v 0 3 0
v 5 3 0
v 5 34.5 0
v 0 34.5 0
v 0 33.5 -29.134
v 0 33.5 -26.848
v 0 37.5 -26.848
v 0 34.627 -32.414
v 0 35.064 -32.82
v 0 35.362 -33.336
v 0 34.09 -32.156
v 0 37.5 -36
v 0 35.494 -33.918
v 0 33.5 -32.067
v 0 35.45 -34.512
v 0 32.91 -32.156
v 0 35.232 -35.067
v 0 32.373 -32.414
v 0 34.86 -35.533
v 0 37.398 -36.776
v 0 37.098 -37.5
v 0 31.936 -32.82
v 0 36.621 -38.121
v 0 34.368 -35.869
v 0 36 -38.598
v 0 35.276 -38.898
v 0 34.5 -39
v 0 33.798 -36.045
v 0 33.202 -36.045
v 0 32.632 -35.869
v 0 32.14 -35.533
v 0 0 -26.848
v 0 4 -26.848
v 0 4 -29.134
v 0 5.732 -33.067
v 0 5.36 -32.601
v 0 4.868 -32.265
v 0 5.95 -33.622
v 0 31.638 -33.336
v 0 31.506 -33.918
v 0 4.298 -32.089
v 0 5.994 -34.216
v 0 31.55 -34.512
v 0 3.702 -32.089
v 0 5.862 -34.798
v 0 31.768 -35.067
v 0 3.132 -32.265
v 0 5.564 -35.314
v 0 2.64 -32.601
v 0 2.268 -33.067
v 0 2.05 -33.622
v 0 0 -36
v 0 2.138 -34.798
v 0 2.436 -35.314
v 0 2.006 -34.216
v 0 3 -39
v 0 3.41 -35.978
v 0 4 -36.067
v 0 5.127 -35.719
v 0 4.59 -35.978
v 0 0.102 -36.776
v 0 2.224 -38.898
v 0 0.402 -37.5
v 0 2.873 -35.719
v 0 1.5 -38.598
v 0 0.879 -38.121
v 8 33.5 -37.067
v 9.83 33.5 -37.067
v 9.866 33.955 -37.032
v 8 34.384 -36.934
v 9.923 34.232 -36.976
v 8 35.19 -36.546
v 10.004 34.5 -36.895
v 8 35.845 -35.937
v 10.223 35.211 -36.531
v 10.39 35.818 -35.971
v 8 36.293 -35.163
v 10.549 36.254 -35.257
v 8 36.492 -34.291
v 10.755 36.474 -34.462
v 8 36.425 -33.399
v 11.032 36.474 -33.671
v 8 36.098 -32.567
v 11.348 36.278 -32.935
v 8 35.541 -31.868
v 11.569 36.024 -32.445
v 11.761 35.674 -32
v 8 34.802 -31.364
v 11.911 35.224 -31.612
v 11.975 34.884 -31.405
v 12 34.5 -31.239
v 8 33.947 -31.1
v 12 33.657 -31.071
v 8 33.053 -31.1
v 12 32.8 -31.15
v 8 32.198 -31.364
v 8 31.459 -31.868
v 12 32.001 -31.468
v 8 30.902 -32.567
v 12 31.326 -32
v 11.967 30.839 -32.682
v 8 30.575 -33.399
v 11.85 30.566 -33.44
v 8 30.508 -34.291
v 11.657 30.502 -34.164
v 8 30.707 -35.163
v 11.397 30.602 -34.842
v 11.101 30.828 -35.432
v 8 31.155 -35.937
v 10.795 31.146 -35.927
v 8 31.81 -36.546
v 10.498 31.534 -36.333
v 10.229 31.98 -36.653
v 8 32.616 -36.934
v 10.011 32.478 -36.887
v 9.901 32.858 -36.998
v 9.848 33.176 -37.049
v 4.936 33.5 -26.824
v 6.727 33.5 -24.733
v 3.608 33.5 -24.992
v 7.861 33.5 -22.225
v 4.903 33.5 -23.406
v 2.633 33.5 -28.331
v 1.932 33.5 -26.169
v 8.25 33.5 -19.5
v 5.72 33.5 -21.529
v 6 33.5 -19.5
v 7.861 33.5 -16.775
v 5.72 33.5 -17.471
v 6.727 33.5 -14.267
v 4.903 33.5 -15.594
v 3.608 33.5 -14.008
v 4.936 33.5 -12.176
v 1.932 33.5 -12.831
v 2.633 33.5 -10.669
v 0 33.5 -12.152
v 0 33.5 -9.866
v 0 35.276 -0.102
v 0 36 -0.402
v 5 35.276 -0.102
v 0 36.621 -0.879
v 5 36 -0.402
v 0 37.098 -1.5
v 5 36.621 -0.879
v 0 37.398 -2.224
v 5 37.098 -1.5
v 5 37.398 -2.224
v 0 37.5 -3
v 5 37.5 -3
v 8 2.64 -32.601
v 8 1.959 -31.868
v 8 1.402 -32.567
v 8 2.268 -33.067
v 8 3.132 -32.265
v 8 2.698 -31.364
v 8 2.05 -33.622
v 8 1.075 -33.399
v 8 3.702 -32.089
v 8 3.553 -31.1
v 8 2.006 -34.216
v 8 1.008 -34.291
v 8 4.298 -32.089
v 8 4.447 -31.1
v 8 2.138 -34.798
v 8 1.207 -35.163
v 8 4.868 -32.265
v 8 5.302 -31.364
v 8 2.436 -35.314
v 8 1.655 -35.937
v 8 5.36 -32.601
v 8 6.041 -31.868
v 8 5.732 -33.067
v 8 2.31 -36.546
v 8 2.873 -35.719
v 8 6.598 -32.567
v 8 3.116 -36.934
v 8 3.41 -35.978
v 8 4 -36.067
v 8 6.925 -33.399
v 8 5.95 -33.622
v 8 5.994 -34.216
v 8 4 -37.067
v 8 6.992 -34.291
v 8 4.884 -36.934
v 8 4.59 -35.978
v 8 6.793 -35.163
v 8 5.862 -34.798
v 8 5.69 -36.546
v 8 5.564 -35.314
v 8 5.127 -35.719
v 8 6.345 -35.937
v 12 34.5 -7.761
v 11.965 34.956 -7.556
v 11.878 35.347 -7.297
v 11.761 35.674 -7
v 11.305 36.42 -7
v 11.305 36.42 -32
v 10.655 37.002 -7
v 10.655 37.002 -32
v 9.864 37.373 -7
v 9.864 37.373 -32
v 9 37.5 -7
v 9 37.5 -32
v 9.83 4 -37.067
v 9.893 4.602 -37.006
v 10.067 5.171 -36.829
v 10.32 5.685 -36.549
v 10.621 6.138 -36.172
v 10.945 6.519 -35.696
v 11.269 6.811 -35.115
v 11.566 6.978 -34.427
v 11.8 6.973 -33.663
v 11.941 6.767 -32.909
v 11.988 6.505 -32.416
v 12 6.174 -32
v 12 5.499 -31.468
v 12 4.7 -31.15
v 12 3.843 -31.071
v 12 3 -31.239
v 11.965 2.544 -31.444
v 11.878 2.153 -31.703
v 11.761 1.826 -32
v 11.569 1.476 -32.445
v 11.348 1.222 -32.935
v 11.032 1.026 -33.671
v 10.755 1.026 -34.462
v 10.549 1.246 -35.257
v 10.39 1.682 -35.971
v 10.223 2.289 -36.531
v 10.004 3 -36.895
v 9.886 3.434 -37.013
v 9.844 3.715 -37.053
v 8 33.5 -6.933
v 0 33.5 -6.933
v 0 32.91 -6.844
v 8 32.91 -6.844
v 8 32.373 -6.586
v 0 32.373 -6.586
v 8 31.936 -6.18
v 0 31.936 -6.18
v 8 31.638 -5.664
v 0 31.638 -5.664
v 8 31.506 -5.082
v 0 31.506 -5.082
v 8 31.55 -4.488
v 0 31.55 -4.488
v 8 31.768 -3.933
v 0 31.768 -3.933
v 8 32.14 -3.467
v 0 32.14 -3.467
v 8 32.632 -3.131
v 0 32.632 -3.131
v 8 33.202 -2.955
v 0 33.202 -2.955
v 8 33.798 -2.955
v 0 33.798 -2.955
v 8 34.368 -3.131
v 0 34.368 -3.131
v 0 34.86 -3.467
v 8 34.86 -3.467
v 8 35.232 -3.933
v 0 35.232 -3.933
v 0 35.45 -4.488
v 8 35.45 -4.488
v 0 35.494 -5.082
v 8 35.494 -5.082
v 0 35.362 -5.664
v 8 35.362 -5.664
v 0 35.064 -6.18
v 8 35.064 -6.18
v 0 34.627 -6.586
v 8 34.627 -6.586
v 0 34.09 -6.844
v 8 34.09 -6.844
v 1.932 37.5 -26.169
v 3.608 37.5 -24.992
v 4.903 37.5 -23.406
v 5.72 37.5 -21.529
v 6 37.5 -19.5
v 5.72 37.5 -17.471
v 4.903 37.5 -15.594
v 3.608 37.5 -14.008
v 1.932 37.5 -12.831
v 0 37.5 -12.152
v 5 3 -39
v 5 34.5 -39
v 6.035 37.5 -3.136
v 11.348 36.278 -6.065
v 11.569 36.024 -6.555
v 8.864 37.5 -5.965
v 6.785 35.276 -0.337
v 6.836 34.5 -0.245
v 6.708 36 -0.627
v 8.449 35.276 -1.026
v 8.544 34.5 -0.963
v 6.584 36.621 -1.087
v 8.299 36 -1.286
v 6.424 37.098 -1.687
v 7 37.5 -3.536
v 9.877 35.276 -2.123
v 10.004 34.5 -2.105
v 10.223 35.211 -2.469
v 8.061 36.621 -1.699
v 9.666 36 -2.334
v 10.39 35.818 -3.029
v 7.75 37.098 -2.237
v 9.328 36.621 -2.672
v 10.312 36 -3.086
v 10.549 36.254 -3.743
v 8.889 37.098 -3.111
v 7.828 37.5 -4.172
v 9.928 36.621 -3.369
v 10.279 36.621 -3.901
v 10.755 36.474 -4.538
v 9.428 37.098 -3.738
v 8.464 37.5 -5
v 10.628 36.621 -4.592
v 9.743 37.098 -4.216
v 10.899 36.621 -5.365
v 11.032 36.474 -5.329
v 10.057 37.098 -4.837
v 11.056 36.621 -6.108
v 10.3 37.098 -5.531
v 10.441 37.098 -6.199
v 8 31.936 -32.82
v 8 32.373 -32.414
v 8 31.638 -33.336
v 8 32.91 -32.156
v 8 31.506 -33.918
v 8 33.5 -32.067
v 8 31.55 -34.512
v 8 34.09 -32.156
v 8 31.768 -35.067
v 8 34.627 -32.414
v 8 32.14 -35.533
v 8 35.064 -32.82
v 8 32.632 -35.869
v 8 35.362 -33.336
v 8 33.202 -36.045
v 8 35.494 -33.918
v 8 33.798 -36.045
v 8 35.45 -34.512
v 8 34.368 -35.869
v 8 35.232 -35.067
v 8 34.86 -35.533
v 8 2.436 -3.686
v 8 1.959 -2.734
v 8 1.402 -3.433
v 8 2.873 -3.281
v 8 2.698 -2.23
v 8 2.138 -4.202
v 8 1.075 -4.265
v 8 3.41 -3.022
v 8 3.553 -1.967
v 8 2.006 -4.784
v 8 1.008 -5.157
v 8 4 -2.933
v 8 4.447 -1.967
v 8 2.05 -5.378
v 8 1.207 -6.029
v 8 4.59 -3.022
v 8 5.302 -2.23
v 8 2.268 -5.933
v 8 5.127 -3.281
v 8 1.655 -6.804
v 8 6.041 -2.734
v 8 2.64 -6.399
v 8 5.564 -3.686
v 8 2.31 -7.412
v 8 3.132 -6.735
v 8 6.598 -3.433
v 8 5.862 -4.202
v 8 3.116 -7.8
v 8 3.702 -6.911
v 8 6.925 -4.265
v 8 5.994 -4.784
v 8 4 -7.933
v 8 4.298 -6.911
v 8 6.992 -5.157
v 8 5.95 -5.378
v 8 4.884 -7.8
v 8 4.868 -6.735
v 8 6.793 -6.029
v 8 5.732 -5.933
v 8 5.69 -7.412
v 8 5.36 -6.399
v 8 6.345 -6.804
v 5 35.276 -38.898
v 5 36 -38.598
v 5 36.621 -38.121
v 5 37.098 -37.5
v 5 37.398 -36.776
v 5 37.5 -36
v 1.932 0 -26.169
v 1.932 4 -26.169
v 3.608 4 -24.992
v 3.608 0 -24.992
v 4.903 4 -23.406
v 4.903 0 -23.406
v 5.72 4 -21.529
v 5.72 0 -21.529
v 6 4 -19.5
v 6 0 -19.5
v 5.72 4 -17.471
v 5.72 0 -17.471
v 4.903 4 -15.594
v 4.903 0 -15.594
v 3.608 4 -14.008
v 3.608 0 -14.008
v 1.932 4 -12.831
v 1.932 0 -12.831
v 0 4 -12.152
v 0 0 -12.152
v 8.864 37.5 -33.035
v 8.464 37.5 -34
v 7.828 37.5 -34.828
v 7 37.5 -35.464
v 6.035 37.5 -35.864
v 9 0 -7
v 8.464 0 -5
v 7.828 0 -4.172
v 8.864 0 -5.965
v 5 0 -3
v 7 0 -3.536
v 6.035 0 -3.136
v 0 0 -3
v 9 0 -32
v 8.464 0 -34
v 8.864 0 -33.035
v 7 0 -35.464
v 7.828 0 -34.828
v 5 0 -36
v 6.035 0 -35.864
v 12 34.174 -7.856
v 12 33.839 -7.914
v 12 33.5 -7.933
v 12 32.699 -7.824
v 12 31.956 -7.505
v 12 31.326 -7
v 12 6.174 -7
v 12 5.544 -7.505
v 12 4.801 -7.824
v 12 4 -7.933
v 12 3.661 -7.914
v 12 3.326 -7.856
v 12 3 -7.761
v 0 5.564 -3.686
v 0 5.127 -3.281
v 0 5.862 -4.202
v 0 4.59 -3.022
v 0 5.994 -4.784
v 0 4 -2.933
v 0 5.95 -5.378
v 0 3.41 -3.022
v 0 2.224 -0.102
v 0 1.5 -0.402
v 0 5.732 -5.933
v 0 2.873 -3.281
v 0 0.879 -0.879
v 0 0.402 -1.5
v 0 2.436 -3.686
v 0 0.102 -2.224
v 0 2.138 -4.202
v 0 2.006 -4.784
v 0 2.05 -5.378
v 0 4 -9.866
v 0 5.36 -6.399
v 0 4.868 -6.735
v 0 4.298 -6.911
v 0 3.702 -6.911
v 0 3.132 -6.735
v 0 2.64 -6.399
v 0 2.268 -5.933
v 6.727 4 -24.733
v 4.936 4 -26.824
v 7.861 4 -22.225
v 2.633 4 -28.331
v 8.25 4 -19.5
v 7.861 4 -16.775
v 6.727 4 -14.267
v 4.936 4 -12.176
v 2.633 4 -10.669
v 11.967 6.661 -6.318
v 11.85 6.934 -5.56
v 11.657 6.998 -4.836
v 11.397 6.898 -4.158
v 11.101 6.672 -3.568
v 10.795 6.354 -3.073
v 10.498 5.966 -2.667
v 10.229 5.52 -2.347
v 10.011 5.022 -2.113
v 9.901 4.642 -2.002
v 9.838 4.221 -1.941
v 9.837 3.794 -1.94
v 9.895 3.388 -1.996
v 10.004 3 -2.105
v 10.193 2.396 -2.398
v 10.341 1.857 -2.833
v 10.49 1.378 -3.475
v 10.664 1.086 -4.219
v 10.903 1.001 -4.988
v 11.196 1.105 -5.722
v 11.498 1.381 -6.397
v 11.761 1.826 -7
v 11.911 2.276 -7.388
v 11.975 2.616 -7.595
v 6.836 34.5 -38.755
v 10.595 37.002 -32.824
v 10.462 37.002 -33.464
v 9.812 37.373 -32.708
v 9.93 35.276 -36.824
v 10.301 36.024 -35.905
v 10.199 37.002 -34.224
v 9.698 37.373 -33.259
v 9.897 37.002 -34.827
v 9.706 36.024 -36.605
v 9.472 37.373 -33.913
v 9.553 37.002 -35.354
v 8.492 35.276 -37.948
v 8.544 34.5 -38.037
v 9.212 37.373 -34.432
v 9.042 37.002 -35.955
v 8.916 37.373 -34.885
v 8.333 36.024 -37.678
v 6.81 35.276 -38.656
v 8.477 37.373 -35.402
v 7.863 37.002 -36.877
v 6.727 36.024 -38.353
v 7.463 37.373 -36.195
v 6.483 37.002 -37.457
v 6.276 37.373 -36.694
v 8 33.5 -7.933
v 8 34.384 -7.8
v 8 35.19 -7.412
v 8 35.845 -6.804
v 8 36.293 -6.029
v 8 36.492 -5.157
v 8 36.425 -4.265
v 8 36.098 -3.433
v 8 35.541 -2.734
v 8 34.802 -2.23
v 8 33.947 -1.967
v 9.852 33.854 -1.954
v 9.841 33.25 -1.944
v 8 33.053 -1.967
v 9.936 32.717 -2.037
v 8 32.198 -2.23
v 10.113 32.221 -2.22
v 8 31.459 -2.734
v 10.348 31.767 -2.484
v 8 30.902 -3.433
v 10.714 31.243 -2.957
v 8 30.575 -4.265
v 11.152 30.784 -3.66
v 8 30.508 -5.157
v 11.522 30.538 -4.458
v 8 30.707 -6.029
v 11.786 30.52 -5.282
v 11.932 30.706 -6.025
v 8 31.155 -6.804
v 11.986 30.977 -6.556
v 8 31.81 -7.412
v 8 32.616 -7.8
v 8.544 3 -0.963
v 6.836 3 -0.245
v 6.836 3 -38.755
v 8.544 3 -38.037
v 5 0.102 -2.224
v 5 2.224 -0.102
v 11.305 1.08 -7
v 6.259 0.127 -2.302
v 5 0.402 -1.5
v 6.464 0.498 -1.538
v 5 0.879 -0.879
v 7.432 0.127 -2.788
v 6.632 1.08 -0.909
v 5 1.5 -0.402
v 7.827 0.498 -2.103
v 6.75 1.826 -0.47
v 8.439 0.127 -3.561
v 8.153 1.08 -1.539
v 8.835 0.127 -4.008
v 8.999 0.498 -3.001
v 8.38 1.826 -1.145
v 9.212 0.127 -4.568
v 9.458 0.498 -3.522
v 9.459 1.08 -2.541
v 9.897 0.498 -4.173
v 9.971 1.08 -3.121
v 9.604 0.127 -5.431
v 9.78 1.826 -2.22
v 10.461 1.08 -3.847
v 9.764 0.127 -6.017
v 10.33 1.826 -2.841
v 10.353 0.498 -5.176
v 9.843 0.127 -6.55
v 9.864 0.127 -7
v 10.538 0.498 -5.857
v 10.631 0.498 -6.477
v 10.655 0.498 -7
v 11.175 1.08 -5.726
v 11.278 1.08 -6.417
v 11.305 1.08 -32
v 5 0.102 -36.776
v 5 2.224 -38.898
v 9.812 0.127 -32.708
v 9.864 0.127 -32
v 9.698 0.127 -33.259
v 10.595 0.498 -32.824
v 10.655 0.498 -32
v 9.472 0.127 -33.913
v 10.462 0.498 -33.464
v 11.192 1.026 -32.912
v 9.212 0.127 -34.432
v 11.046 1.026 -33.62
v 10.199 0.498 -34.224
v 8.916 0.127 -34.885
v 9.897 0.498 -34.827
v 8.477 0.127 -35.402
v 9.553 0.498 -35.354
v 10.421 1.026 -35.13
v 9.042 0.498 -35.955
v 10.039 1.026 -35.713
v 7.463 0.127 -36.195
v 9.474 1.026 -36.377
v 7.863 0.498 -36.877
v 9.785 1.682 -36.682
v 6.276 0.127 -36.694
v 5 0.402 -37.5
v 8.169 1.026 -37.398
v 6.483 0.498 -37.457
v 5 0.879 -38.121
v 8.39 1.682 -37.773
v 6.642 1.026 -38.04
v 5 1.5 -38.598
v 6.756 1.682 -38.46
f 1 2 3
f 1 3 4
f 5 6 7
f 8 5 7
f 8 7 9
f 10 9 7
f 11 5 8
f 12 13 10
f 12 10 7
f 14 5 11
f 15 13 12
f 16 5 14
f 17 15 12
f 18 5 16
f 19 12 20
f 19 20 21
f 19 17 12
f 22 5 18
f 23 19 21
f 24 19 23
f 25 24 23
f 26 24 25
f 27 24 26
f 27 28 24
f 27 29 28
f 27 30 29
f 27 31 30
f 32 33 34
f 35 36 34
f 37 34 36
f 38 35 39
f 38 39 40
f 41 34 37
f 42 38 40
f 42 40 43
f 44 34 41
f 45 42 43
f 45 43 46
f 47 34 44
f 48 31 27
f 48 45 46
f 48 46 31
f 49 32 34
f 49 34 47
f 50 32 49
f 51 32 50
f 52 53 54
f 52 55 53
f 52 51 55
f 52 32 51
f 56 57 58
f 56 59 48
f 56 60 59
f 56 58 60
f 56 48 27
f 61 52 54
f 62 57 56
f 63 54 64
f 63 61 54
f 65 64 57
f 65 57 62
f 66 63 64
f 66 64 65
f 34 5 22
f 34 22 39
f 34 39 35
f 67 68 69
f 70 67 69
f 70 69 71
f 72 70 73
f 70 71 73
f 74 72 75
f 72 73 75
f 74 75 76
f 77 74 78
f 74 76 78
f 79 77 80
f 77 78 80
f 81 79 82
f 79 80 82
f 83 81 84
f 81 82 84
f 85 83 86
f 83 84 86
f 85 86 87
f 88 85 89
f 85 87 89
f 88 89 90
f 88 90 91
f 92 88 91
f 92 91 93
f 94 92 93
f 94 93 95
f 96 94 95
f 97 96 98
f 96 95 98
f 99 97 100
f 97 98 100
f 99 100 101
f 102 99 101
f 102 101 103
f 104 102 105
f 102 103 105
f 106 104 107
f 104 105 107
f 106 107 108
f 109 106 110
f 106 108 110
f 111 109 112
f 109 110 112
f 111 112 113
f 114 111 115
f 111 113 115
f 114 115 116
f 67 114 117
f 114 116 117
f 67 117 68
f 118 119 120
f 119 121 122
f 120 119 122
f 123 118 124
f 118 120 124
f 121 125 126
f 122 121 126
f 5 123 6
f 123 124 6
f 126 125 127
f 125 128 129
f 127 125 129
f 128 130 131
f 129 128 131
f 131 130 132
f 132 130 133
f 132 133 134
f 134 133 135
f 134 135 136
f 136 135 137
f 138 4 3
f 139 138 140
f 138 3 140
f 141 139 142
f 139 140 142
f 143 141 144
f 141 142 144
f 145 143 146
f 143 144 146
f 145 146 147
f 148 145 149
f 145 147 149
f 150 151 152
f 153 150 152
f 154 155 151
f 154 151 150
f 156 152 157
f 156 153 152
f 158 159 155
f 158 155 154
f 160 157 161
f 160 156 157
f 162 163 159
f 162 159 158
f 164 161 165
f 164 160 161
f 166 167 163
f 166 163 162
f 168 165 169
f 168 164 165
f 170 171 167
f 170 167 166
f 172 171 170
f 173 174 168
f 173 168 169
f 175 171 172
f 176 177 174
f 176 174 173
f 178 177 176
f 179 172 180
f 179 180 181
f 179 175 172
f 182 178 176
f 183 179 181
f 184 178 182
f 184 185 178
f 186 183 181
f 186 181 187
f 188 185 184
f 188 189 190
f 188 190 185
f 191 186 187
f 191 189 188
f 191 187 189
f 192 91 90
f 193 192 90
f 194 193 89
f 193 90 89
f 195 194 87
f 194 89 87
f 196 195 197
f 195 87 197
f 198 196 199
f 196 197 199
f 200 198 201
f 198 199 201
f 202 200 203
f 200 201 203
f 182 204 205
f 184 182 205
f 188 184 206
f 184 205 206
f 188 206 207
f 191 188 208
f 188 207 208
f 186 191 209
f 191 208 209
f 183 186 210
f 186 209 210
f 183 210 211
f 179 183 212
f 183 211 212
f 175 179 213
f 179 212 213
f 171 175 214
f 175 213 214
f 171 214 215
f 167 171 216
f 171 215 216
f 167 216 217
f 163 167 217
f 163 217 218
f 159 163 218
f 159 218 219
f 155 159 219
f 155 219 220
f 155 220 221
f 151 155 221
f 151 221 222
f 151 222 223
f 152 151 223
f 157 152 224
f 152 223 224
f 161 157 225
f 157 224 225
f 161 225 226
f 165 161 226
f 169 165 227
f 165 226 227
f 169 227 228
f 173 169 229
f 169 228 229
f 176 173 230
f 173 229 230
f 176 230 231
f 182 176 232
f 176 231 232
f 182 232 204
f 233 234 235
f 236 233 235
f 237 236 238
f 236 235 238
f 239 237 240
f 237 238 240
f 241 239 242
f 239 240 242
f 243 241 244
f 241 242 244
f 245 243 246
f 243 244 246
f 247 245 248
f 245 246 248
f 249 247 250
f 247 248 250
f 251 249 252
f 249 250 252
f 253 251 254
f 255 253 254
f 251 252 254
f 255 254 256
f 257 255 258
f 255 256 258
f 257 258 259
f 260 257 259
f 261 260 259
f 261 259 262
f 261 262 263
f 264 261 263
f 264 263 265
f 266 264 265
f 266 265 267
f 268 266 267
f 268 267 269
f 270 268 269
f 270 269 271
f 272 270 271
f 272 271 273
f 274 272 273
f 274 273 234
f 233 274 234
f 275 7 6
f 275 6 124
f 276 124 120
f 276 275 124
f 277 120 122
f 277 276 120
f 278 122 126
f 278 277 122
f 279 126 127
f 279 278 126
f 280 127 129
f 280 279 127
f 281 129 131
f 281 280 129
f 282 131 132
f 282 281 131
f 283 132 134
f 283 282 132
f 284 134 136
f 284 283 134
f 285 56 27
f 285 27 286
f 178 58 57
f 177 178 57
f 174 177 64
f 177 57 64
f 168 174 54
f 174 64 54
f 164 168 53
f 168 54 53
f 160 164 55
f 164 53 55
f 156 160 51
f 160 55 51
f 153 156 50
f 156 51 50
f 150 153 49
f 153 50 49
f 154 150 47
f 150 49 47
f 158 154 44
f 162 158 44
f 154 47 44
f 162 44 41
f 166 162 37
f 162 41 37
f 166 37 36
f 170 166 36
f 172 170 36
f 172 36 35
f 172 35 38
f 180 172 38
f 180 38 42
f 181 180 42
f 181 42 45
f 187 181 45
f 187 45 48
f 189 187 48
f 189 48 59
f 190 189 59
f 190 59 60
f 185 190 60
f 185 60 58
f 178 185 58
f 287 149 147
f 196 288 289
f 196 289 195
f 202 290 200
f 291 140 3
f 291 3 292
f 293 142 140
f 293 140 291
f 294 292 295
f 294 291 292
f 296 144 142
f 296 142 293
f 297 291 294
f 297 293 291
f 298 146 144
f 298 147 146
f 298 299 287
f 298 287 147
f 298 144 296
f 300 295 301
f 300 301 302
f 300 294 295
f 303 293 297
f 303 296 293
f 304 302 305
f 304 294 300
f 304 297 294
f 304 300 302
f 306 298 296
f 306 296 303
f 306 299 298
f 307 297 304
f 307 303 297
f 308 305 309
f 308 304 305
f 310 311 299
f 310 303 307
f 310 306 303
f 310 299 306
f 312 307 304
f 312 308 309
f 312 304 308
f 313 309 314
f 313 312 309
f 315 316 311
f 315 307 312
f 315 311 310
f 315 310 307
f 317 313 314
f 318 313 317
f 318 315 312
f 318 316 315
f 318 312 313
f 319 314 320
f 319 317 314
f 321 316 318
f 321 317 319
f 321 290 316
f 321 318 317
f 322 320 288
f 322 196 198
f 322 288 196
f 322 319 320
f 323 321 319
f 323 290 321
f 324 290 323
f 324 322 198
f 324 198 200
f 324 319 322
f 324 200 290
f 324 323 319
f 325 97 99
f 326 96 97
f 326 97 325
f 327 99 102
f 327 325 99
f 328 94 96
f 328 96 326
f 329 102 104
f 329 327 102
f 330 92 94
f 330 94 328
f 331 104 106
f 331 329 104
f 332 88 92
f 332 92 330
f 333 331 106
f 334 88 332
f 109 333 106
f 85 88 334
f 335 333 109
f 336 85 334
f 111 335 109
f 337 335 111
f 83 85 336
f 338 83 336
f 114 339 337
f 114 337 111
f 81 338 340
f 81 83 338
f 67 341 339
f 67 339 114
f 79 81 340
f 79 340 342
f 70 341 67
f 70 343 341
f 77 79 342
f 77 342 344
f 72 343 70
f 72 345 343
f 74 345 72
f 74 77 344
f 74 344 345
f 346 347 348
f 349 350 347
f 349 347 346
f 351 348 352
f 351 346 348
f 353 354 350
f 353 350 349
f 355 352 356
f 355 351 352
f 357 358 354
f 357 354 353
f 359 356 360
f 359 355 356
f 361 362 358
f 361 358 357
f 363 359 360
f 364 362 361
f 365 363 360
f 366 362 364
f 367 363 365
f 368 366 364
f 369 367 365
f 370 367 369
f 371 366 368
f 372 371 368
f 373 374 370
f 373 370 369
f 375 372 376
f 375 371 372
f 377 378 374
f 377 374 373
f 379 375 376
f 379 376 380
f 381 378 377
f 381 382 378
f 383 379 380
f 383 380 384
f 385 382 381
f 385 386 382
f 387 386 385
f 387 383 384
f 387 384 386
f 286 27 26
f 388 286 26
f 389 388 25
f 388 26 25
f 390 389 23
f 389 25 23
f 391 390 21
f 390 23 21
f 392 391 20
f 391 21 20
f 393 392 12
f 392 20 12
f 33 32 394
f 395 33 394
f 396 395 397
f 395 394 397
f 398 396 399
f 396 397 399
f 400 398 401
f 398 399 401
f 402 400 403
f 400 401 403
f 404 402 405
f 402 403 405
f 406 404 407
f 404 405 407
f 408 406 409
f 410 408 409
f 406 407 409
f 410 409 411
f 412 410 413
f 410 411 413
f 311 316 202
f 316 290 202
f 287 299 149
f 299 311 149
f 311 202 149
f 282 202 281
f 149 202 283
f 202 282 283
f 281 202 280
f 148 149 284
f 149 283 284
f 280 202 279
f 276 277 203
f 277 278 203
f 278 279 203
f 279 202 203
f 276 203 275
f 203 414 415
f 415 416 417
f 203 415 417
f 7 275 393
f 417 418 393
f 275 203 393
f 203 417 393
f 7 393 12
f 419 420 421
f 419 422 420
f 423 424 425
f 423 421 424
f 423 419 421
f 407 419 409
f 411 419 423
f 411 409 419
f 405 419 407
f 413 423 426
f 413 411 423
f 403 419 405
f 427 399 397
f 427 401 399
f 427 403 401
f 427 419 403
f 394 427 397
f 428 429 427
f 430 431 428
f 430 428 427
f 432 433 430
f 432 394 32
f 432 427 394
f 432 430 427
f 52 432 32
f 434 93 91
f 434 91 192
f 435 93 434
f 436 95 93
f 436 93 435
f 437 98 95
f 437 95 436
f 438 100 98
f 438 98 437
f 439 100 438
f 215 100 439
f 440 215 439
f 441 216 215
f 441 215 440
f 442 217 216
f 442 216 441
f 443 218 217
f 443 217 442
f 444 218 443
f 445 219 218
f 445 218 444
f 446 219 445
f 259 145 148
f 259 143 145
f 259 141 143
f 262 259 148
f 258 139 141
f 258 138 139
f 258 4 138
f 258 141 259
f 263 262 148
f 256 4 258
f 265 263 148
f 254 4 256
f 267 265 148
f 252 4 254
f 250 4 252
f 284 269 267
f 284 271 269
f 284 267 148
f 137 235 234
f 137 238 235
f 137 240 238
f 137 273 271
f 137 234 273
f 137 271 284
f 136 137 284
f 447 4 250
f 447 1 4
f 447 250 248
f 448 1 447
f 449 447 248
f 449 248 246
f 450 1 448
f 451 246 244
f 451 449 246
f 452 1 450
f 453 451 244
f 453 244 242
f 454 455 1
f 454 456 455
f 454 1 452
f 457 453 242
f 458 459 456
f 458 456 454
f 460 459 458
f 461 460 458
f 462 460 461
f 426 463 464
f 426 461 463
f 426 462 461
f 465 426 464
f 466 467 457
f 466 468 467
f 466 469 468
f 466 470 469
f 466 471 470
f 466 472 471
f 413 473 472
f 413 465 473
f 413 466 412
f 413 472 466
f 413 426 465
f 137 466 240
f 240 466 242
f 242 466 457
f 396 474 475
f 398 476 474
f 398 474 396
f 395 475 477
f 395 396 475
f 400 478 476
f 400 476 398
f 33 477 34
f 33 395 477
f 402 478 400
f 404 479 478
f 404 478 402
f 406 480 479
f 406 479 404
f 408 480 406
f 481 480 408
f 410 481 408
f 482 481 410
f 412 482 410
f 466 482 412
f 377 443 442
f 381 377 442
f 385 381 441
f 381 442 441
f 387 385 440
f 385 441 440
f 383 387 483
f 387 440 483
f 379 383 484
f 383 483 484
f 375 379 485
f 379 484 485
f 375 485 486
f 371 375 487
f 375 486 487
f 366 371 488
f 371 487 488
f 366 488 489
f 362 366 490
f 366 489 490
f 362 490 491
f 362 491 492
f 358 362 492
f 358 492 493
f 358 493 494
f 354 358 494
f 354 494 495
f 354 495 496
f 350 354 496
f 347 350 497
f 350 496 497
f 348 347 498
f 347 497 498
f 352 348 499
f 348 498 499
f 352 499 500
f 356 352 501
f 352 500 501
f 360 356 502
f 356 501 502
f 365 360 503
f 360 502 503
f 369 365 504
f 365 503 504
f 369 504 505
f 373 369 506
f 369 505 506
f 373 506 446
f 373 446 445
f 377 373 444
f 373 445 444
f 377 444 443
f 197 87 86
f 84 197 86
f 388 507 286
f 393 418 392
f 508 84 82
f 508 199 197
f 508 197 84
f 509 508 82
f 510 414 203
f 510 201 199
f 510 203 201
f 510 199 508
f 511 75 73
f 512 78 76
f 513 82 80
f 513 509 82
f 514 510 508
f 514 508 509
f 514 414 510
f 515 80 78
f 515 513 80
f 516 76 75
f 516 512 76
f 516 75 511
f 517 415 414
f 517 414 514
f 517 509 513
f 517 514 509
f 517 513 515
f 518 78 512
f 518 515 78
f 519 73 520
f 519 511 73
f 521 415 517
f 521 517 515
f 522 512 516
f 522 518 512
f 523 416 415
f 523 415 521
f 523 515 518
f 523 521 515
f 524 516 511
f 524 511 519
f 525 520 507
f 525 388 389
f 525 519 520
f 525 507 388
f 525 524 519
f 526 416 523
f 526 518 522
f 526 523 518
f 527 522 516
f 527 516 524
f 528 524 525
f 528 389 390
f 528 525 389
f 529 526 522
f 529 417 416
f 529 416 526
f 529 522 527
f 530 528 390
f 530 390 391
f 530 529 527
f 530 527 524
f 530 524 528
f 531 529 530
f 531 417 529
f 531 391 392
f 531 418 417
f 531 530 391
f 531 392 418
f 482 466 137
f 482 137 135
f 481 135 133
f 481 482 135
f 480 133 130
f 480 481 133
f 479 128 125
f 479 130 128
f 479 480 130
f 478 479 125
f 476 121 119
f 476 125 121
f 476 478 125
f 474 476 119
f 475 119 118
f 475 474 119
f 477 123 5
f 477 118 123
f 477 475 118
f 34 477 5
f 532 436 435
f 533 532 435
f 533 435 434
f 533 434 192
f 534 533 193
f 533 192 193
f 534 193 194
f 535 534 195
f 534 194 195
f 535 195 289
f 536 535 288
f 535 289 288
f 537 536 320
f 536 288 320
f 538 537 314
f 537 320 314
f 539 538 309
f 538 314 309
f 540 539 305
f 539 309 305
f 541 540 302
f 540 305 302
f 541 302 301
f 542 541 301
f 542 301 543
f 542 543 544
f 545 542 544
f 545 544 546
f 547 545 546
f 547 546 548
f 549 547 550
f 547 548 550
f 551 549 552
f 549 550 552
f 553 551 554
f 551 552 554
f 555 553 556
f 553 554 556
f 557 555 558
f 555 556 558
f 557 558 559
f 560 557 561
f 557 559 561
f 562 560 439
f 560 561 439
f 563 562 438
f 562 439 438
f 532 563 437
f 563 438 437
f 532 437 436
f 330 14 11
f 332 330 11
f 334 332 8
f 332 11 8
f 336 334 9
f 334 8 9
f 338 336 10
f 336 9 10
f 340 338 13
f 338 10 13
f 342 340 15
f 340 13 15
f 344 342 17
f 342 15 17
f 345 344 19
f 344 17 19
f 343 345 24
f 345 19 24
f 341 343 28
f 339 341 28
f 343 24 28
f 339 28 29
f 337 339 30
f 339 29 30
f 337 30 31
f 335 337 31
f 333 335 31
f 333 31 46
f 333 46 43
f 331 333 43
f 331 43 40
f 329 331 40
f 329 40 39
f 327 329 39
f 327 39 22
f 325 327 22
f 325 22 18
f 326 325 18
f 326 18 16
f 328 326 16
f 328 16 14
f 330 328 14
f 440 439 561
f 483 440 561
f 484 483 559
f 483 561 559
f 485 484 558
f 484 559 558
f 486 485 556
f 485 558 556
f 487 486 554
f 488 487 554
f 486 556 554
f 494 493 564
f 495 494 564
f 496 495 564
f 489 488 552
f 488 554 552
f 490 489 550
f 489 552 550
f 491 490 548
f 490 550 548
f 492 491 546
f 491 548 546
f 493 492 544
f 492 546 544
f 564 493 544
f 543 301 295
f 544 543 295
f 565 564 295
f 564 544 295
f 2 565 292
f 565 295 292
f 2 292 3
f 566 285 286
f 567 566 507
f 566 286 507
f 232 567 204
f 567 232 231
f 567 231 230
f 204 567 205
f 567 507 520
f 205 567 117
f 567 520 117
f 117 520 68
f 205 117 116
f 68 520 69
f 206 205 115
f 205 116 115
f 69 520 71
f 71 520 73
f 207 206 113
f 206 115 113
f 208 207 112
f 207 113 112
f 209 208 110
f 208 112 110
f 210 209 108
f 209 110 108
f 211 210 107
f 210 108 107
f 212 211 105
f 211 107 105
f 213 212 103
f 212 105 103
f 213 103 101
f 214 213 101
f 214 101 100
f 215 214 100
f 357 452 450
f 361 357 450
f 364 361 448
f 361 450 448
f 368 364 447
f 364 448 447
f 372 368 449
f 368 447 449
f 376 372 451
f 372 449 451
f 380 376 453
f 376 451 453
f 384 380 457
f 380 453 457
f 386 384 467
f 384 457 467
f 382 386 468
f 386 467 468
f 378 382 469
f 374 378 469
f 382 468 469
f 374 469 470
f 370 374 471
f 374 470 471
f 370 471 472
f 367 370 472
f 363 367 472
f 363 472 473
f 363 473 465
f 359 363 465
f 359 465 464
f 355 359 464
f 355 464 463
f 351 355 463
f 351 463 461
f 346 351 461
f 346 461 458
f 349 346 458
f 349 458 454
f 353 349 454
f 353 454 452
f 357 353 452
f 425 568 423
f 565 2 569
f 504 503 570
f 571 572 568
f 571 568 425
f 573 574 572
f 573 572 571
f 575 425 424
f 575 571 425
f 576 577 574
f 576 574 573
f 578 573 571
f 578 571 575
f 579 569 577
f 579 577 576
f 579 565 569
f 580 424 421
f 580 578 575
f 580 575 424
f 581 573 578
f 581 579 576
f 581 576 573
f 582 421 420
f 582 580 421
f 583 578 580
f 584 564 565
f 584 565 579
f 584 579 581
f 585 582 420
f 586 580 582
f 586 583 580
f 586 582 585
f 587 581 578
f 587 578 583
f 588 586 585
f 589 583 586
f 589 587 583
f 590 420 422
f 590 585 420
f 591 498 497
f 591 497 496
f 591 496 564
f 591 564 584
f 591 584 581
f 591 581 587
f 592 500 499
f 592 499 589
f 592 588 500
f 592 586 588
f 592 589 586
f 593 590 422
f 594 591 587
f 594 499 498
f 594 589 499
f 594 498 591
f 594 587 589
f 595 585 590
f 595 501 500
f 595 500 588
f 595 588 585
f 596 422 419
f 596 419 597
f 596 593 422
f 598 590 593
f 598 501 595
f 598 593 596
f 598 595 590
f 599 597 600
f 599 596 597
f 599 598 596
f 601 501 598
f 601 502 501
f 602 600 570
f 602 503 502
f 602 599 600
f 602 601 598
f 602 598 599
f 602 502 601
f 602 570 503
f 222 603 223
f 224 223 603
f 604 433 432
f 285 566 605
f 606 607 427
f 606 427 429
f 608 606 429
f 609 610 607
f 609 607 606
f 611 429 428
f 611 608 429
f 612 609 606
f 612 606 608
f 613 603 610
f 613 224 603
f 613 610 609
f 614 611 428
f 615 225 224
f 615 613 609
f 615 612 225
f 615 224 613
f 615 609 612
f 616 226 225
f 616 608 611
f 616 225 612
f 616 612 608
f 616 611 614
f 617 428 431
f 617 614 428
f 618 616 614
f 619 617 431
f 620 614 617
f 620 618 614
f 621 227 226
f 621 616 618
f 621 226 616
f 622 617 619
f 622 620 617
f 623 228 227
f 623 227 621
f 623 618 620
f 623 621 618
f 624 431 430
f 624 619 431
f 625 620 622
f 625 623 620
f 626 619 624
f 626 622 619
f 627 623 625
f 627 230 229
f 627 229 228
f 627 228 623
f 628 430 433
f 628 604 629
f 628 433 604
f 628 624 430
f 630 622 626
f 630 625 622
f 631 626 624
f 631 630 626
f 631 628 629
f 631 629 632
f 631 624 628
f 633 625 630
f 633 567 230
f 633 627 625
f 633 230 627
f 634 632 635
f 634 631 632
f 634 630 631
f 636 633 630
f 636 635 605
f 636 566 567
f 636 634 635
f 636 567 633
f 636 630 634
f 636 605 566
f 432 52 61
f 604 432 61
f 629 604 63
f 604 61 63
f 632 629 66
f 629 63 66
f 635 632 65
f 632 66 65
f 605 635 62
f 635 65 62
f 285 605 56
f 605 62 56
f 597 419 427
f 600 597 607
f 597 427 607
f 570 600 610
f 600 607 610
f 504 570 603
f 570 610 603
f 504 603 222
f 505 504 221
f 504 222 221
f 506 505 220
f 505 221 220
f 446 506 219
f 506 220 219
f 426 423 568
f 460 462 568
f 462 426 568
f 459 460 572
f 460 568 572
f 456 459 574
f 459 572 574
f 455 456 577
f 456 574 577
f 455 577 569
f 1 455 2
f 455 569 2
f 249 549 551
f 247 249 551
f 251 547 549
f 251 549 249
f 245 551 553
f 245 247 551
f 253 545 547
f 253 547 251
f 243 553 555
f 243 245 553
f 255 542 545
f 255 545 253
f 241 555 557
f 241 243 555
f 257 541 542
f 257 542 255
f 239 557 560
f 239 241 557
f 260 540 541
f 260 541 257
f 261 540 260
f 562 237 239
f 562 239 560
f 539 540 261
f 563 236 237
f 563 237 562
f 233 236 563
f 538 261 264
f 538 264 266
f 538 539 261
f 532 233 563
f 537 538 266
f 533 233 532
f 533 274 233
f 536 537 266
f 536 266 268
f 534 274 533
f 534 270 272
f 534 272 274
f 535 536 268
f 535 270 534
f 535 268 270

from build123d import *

# Parameters (mm, degrees)
BOSS_EXTRU_1_DEPTH      = 37.5
BOSS_EXTRU_2_DEPTH      = 4
ESQUISSE3_R             = 2
ENL_V_MAT_EXTRU_1_DEPTH = 56.418859606
ESQUISSE5_R             = 3
ENL_V_MAT_EXTRU_2_DEPTH = 4
CONG_1_R                = 7
CONG_2_R                = 3


with BuildPart() as part:
    # Esquisse1 → Boss.-Extru.1 (new body)
    with BuildSketch(Plane(origin=(0, 0, 0), x_dir=(1, 0, 0), z_dir=(0, 1, 0))):
        with BuildLine():
            Line((0, 29.133924434), (0, 39))
            Line((0, 39), (12, 39))
            Line((12, 39), (12, 0))
            Line((12, 0), (0, 0))
            Line((0, 0), (0, 9.866075566))
            ThreePointArc((0, 9.866075566), (8.25, 19.5), (0, 29.133924434))
        make_face()
    extrude(amount=BOSS_EXTRU_1_DEPTH)

    # Esquisse2 → Boss.-Extru.2 (add)
    with BuildSketch(Plane.XZ):
        with BuildLine():
            Line((0, 0), (12, 0))
            Line((12, 0), (12, -39))
            Line((12, -39), (0, -39))
            Line((0, -39), (0, -26.848469228))
            ThreePointArc((0, -26.848469228), (6, -19.5), (0, -12.151530772))
            Line((0, -12.151530772), (0, 0))
        make_face()
    boss_extru_2 = extrude(amount=-BOSS_EXTRU_2_DEPTH)

    # Symétrie1: Boss.-Extru.2 across plane
    add(boss_extru_2.mirror(Plane.ZX.offset(18.75)))

    # Esquisse3 → Enlèv. mat.-Extru.1 (cut, through all)
    with BuildSketch(Plane.ZY):
        with Locations((-34.066962217, 33.5)):
            Circle(ESQUISSE3_R)
        with Locations(Location((-34.066962217, 4, 0), (0, 0, 180))):
            Circle(ESQUISSE3_R)
        with Locations((-4.933037783, 4)):
            Circle(ESQUISSE3_R)
        with Locations(Location((-4.933037783, 33.5, 0), (0, 0, 180))):
            Circle(ESQUISSE3_R)
    extrude(amount=-ENL_V_MAT_EXTRU_1_DEPTH, mode=Mode.SUBTRACT)

    # Esquisse5 → Enlèv. mat.-Extru.2 (cut)
    with BuildSketch(Plane(origin=(12, 0, 0), x_dir=(0, 0, -1), z_dir=(1, 0, 0))):
        with Locations((4.933037783, 33.5)):
            Circle(ESQUISSE5_R)
        with Locations((34.066962217, 33.5)):
            Circle(ESQUISSE5_R)
        with Locations((34.066962217, 4)):
            Circle(ESQUISSE5_R)
        with Locations((4.933037783, 4)):
            Circle(ESQUISSE5_R)
    extrude(amount=-ENL_V_MAT_EXTRU_2_DEPTH, mode=Mode.SUBTRACT)

    # Congé1
    # the kernel refuses this fillet: 7 mm, written as the material it takes off along each edge
    with BuildSketch(Plane(origin=(12, 55, -39), x_dir=(-1, 0, 0), z_dir=(0, -1, 0)), Plane(origin=(12, 55, 0), x_dir=(0, 0, -1), z_dir=(0, -1, 0))) as cong_1_piece_1:
        with BuildLine():
            CenterArc((CONG_1_R, -CONG_1_R), CONG_1_R, 90, 90)
            Line((0, -CONG_1_R), (0, 0))
            Line((0, 0), (CONG_1_R, 0))
        make_face()
    extrude(amount=72.5, mode=Mode.SUBTRACT)

    # Congé2
    # the kernel refuses this fillet: 3 mm, written as the material it takes off along each edge
    with BuildSketch(Plane(origin=(5, 0, 0), x_dir=(0, 0, -1), z_dir=(-1, 0, 0)), Plane(origin=(-7.5, 0, -39), x_dir=(0, 0, 1), z_dir=(1, 0, 0)), Plane(origin=(-7.5, 37.5, -39), x_dir=(0, -1, 0), z_dir=(1, 0, 0))) as cong_2_piece_1:
        with BuildLine():
            CenterArc((CONG_2_R, -CONG_2_R), CONG_2_R, 90, 90)
            Line((0, -CONG_2_R), (0, 0))
            Line((0, 0), (CONG_2_R, 0))
        make_face()
    extrude(amount=12.5, mode=Mode.SUBTRACT)
    with BuildSketch(Plane(origin=(5, 0, -7), x_dir=(0, 0, 1), z_dir=(-1, 0, 0))) as cong_2_piece_2:
        with BuildLine():
            CenterArc((7 - CONG_2_R, CONG_2_R), CONG_2_R, 270, 90)
            Line((7, CONG_2_R), (7, 0))
            Line((7, 0), (7 - CONG_2_R, 0))
        make_face()
    revolve(axis=Axis((5, 0, -7), (0, 1, 0)), revolution_arc=90, mode=Mode.SUBTRACT)
    with BuildSketch(Plane(origin=(5, 0, -32), x_dir=(1, 0, 0), z_dir=(0, 0, 1))) as cong_2_piece_3:
        with BuildLine():
            CenterArc((7 - CONG_2_R, CONG_2_R), CONG_2_R, 270, 90)
            Line((7, CONG_2_R), (7, 0))
            Line((7, 0), (7 - CONG_2_R, 0))
        make_face()
    revolve(axis=Axis((5, 0, -32), (0, 1, 0)), revolution_arc=90, mode=Mode.SUBTRACT)
    with BuildSketch(Plane(origin=(5, 37.5, 0), x_dir=(0, 0, -1), z_dir=(-1, 0, 0))) as cong_2_piece_4:
        with BuildLine():
            CenterArc((CONG_2_R, CONG_2_R), CONG_2_R, 180, 90)
            Line((0, CONG_2_R), (0, 0))
            Line((0, 0), (CONG_2_R, 0))
        make_face()
    extrude(amount=12.5, mode=Mode.SUBTRACT)
    with BuildSketch(Plane(origin=(5, 37.5, -7), x_dir=(0, 0, 1), z_dir=(-1, 0, 0))) as cong_2_piece_5:
        with BuildLine():
            CenterArc((7 - CONG_2_R, -CONG_2_R), CONG_2_R, 0, 90)
            Line((7, -CONG_2_R), (7, 0))
            Line((7, 0), (7 - CONG_2_R, 0))
        make_face()
    revolve(axis=Axis((5, 37.5, -7), (0, 1, 0)), revolution_arc=90, mode=Mode.SUBTRACT)
    with BuildSketch(Plane(origin=(5, 37.5, -32), x_dir=(1, 0, 0), z_dir=(0, 0, 1))) as cong_2_piece_6:
        with BuildLine():
            CenterArc((7 - CONG_2_R, -CONG_2_R), CONG_2_R, 0, 90)
            Line((7, -CONG_2_R), (7, 0))
            Line((7, 0), (7 - CONG_2_R, 0))
        make_face()
    revolve(axis=Axis((5, 37.5, -32), (0, 1, 0)), revolution_arc=90, mode=Mode.SUBTRACT)
    with BuildSketch(Plane(origin=(12, 0, -32), x_dir=(-1, 0, 0), z_dir=(0, 0, 1))) as cong_2_piece_7:
        with BuildLine():
            CenterArc((CONG_2_R, -CONG_2_R), CONG_2_R, 90, 90)
            Line((0, -CONG_2_R), (0, 0))
            Line((0, 0), (CONG_2_R, 0))
        make_face()
    extrude(amount=25, mode=Mode.SUBTRACT)
    with BuildSketch(Plane(origin=(12, 37.5, -32), x_dir=(-1, 0, 0), z_dir=(0, 0, 1))) as cong_2_piece_8:
        with BuildLine():
            CenterArc((CONG_2_R, CONG_2_R), CONG_2_R, 180, 90)
            Line((0, CONG_2_R), (0, 0))
            Line((0, 0), (CONG_2_R, 0))
        make_face()
    extrude(amount=25, mode=Mode.SUBTRACT)


solid = part.part
